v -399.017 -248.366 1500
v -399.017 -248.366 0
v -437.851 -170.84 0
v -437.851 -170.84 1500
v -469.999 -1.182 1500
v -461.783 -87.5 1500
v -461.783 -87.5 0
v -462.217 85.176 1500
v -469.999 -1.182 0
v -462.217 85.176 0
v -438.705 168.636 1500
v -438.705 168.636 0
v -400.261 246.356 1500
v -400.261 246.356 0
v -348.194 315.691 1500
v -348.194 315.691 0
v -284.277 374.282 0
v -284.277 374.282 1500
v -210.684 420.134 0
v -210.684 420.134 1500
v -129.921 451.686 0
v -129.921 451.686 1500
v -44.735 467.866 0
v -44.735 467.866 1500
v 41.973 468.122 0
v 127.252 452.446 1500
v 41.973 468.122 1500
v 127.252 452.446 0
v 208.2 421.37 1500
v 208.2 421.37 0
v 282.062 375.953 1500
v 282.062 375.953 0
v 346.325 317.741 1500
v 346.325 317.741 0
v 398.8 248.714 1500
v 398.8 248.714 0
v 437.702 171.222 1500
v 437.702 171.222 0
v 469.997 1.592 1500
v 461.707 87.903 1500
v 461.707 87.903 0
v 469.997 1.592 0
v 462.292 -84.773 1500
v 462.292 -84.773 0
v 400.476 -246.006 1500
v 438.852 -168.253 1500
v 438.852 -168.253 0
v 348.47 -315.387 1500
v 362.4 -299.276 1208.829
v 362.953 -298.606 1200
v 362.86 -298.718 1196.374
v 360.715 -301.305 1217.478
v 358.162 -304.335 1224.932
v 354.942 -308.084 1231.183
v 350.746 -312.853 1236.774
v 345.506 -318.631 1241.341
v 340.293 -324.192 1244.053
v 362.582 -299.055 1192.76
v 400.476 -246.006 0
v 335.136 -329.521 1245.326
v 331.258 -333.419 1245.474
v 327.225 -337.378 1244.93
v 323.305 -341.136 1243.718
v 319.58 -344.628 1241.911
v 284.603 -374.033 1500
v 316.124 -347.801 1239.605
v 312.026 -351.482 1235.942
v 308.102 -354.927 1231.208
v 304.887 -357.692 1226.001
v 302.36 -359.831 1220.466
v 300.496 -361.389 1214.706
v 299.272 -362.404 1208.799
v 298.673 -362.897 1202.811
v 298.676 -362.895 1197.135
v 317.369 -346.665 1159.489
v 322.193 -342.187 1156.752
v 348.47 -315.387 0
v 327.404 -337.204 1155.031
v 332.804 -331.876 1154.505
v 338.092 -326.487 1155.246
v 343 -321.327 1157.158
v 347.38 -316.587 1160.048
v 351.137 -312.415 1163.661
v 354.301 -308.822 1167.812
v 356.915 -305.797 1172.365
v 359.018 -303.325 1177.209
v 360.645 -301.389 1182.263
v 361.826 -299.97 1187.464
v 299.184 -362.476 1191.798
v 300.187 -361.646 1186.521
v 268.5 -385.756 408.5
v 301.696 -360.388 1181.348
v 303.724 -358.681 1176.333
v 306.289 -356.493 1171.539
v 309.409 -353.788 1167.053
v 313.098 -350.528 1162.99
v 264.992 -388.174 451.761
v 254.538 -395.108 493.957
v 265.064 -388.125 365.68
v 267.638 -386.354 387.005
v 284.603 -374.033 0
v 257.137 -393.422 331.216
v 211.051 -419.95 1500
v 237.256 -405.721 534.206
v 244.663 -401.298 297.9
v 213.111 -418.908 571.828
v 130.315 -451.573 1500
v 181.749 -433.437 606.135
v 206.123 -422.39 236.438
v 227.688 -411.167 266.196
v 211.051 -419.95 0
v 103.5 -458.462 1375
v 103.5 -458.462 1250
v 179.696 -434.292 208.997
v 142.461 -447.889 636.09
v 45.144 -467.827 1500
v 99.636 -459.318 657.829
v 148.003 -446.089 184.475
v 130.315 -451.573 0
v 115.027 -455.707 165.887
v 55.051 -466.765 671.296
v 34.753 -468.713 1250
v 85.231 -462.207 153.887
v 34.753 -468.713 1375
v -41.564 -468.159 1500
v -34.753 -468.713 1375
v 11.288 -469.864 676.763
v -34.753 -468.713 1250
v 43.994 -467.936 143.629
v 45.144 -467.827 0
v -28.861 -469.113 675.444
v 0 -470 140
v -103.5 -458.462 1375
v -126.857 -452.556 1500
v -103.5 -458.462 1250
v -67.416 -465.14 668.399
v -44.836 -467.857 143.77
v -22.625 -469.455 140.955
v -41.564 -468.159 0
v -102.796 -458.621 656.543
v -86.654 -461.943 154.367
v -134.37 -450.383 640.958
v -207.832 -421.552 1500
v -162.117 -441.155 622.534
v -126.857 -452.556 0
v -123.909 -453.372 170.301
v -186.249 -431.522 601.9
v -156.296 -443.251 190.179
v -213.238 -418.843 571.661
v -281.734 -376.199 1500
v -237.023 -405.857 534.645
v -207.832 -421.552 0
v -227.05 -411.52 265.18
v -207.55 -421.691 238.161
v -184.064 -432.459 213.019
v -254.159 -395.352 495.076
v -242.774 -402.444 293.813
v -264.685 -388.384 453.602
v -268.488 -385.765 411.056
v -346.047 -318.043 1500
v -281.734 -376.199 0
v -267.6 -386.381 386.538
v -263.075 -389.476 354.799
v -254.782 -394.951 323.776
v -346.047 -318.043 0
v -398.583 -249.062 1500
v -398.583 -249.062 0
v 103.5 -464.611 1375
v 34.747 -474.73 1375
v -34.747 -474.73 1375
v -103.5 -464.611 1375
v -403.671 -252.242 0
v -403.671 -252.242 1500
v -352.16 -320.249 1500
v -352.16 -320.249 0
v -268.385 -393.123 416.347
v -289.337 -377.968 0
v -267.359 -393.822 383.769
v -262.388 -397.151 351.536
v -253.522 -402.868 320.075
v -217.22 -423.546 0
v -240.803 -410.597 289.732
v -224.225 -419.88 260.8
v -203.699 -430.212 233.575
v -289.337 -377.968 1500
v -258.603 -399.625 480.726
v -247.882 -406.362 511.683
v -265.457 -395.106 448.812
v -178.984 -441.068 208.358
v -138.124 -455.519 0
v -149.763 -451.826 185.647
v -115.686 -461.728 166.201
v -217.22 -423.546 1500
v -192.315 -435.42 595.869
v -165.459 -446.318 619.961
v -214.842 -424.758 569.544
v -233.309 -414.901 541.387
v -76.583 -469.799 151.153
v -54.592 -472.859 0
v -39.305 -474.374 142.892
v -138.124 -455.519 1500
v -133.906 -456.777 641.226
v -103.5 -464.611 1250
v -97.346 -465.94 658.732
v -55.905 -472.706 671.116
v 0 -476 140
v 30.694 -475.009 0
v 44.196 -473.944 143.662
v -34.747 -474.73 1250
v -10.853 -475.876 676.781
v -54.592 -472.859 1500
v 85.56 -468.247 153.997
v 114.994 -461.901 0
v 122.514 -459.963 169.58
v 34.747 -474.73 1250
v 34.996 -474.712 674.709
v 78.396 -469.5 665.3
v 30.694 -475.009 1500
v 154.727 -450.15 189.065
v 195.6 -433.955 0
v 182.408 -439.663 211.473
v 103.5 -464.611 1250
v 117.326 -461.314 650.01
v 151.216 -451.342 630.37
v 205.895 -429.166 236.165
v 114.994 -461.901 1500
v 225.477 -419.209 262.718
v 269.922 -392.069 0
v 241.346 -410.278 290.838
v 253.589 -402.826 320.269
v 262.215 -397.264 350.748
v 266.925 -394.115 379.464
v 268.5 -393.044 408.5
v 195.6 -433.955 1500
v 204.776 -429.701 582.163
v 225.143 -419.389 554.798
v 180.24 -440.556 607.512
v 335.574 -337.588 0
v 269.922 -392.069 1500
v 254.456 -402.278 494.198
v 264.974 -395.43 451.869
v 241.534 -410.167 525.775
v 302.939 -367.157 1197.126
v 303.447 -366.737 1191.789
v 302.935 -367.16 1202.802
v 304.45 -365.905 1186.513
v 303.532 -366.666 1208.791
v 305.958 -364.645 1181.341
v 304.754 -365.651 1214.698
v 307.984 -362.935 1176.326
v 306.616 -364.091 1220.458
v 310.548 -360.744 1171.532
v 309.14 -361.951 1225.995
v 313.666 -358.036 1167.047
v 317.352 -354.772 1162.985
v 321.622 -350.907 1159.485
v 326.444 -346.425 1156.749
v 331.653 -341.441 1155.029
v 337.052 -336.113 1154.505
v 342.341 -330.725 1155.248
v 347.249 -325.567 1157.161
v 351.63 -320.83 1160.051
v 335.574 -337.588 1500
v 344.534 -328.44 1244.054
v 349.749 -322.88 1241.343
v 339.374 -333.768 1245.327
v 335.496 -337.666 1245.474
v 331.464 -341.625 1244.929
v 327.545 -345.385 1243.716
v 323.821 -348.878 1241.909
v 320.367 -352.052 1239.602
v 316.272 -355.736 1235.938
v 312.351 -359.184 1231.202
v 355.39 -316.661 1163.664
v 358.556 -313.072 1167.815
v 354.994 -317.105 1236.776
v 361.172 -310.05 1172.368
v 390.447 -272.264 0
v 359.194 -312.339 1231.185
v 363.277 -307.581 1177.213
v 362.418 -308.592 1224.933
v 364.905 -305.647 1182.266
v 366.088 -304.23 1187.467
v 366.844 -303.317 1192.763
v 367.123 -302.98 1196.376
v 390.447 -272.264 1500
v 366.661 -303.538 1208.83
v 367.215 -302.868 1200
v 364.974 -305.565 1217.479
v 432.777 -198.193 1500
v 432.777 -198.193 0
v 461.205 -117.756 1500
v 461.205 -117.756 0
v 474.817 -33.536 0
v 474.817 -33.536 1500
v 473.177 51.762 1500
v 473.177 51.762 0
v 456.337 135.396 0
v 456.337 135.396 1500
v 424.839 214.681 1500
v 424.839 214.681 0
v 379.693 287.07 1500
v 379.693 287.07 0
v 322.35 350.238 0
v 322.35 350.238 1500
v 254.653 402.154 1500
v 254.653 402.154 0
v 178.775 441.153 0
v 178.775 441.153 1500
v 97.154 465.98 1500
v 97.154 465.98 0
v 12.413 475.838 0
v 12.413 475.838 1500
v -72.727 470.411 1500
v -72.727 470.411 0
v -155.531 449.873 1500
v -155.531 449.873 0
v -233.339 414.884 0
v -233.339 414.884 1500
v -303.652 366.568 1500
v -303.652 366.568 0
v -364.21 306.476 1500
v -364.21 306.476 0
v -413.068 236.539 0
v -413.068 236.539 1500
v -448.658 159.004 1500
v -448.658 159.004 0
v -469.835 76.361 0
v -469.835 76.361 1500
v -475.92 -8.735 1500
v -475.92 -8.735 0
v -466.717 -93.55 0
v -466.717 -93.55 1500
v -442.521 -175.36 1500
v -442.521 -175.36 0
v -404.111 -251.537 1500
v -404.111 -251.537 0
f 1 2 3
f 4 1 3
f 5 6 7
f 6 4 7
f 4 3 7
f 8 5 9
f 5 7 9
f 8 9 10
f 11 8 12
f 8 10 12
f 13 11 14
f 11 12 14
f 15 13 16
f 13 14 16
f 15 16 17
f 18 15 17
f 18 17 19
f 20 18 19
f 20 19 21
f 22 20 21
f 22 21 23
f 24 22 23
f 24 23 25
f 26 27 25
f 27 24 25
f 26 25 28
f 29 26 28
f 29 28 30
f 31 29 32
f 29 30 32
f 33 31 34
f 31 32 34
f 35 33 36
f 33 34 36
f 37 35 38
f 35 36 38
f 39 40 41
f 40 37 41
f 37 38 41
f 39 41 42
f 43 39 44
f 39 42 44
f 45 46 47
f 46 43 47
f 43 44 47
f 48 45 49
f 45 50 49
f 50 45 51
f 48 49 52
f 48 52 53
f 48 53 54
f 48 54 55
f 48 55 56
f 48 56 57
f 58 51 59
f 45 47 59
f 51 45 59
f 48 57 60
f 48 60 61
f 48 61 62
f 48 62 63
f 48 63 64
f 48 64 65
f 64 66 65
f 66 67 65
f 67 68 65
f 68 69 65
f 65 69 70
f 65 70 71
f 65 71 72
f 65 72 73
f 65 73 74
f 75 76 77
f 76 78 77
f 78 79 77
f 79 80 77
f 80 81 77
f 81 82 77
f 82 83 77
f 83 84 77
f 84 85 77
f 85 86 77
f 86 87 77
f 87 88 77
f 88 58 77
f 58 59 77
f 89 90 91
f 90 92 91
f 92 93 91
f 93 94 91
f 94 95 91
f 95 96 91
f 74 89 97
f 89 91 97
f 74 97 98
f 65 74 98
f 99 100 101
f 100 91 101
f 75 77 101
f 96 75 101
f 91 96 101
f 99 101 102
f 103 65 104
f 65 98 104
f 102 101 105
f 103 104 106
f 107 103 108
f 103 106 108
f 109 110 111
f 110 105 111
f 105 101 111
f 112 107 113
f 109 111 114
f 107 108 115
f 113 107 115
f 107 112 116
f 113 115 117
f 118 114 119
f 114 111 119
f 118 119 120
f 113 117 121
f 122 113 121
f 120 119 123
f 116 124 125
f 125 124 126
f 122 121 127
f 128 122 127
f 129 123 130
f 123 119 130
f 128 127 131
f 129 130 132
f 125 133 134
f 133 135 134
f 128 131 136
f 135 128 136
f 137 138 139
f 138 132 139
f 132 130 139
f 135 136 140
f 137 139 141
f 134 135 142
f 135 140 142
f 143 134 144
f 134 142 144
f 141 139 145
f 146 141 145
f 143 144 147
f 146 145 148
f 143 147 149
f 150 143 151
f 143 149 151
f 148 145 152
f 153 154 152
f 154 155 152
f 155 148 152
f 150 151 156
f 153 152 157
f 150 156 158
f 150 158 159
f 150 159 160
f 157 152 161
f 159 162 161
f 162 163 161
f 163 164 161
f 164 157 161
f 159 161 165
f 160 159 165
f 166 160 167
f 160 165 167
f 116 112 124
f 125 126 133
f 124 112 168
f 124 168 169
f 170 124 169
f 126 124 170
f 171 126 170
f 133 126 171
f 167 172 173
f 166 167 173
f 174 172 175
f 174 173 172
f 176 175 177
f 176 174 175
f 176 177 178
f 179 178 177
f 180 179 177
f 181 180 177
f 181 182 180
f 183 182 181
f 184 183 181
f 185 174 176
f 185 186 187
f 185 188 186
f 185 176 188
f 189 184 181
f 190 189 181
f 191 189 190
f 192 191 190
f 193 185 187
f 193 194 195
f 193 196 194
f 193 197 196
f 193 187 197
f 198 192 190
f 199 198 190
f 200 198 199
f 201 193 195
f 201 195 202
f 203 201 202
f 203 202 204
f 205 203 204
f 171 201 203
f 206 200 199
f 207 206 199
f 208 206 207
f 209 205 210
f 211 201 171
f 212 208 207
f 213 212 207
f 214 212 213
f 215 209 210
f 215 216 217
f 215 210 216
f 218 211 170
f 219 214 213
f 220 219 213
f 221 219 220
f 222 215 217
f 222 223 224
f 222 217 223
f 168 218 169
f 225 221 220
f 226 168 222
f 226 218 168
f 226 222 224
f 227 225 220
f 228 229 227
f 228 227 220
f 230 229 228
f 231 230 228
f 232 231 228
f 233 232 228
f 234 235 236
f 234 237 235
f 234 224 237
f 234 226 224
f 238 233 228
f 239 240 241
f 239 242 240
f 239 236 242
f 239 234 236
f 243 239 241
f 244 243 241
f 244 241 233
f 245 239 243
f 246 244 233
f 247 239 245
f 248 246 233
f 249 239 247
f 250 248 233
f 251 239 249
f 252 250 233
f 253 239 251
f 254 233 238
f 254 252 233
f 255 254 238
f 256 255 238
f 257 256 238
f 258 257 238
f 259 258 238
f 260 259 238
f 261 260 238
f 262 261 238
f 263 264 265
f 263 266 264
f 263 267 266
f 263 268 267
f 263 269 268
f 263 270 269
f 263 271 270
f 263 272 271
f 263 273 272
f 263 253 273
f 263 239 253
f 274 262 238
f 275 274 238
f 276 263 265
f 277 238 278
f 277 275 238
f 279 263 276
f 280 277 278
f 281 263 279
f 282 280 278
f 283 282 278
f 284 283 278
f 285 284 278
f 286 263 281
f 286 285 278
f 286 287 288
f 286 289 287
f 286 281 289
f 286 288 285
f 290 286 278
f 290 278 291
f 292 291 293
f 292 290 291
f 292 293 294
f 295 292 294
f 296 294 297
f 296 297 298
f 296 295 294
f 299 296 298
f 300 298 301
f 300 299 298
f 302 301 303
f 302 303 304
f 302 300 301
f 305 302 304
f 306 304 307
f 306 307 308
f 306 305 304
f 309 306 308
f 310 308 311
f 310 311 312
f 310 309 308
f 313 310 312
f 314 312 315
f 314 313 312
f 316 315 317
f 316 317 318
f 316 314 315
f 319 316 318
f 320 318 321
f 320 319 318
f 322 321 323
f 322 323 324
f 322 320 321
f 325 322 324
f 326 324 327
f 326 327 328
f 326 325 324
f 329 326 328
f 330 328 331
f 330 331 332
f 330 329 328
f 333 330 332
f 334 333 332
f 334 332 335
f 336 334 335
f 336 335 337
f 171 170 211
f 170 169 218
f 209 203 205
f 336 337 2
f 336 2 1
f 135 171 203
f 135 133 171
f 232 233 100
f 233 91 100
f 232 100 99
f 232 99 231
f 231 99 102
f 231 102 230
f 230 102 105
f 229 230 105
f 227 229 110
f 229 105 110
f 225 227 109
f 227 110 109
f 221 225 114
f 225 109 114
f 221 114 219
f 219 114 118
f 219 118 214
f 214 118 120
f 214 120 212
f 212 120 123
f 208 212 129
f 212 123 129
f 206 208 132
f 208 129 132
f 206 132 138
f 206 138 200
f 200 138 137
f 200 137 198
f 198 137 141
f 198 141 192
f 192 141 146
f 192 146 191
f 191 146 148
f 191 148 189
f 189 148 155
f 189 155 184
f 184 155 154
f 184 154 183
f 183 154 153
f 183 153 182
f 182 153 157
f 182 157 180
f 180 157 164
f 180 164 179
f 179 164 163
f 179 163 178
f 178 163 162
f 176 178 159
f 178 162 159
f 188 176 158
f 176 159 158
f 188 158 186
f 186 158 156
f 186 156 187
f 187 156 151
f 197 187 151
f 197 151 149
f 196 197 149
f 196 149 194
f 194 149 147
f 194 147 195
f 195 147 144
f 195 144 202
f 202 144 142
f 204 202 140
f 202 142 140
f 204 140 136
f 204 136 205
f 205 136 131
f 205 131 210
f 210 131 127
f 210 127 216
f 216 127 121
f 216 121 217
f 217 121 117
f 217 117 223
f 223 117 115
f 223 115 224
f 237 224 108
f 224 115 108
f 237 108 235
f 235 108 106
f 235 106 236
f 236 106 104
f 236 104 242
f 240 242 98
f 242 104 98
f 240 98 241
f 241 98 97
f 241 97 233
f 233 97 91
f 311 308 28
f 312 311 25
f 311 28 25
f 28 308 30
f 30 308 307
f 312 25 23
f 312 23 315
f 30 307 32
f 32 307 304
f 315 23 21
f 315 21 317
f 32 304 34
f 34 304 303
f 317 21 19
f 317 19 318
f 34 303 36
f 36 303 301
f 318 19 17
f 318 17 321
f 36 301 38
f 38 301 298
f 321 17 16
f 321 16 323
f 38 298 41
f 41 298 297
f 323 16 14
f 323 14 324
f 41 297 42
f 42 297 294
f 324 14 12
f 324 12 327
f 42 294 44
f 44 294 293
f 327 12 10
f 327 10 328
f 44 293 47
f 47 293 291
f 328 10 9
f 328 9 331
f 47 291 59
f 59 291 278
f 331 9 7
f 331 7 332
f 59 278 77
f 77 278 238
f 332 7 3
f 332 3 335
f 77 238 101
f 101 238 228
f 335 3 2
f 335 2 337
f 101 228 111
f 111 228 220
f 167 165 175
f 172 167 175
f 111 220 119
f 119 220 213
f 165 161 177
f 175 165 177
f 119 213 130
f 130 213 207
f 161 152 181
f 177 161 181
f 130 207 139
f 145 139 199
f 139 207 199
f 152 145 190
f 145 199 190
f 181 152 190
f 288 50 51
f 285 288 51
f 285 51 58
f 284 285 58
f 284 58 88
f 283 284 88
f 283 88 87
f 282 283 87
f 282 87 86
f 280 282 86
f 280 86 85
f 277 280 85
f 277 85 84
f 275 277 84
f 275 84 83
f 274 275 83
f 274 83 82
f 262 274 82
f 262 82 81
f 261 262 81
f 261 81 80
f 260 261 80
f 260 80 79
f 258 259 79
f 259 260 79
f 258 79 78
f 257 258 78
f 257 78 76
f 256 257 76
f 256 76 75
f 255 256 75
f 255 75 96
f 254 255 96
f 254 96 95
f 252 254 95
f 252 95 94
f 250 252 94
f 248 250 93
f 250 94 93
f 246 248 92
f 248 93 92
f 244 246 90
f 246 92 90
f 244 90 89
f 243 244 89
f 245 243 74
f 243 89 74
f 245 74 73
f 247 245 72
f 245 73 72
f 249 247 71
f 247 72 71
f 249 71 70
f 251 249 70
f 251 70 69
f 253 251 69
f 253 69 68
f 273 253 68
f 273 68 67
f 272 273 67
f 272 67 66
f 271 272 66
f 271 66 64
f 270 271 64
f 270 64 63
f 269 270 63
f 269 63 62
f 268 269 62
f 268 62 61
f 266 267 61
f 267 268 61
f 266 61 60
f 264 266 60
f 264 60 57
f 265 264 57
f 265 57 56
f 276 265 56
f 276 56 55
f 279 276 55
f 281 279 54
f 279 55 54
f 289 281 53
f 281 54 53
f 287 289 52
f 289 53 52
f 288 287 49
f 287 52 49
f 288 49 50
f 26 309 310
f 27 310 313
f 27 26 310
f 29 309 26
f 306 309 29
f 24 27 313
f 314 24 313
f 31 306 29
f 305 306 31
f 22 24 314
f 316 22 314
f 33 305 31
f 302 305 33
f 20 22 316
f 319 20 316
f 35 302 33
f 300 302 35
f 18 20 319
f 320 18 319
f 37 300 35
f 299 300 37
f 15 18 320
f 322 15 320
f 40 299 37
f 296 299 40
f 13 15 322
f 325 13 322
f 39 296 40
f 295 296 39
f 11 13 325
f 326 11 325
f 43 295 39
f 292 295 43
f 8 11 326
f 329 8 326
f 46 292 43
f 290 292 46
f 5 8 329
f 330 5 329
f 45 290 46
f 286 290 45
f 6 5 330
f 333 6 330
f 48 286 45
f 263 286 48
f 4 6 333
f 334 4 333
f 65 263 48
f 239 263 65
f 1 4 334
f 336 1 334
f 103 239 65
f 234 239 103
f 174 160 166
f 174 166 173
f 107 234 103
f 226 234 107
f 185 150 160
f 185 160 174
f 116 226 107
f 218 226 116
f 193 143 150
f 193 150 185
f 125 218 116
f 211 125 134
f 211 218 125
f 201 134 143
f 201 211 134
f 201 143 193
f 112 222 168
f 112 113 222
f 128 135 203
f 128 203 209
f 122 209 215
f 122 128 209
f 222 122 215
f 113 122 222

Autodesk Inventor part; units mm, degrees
sketch "Sketch13" plane through (0, 0, 0) normal (0, 0, 1) x (1, 0, 0)
  circle A0 centre (0, 0) radius 476 construction
  line L0 (0, 0) -> (0, -476)
  line L1 (0, 0) -> (-403.6709, -252.2416)
  line L2 (0, 0) -> (336.5828, -336.5828)
  line L3 (0, 0) -> (0, -476)
  line L4 (0, 0) -> (0, -476)
  line L5 (0, 0) -> (-424.1191, -216.0995)
  arc A1 (-403.6709, -252.2416) -> (0, -476) centre (0, 0) ccw
  dimension "d53" = 952
  dimension "d54" = 58
  dimension "d55" = 0
  dimension "d56" = 0
  dimension "d57" = 315
  dimension "d58" = 63
ref_plane "WeldJoint" through (0, 0, -10) normal (0.5299, -0.848, 0) x (0, 0, 1)
ref_plane "Outer" through (0, 0, -10) normal (0.454, -0.891, 0) x (0, 0, 1)
ref_plane "Clock_Feeder" through (0, 0, -10) normal (0.7071, 0.7071, 0) x (0, 0, 1)
ref_plane "Charging" through (0, 0, -10) normal (1, 0, 0) x (0, 0, 1)
ref_plane "Accsess" through (0, 0, -10) normal (1, 0, 0) x (0, 0, 1)
sketch "Sketch14" plane through (0, 0, -10) normal (0.5299, -0.848, 0) x (0, 0, 1)
  line L0 (1510, 470) -> (10, 470)
  line L1 (10, 470) -> (10, 476)
  line L2 (10, 476) -> (1510, 476)
  line L3 (1510, 476) -> (1510, 470)
  line L4 (10, 0) -> (825.0673, 0)
  point P0 (10, 473)
  dimension "d59" = 1500
  dimension "d60" = 6
  dimension "d61" = 952
revolve "Revolution2" add sketch "Sketch14" angle 359.9 about axis through (0, 0, 0) along (0, 0, 1)
sketch "Sketch AnglePlane_Feeder" plane through (0, 0, -10) normal (0.7071, 0.7071, 0) x (0, 0, 1)
  line L0 (10, -476) -> (10, 476) projected
  line L1 (10, 0) -> (1210, 0)
  line L2 (1210, 0) -> (1210, 476)
  line L3 (1210, 476) -> (10, 476)
  line L4 (10, 476) -> (10, 0)
  point P0 (10, -107.0767)
  point P1 (10, -107.886)
  dimension "d63" = 952
  dimension "d64" = 90
  dimension "frd_hght" = 1200
ref_plane "AnglePlane_Feeder" through (0, 0, 1200) normal (0.7071, -0.7071, 0) x (0.7071, 0.7071, 0)
sketch "Sketch16" plane through (0, 0, 1200) normal (0.7071, -0.7071, 0) x (0.7071, 0.7071, 0)
  circle A0 centre (0, 0) radius 45.5
  point P0 (0, -1200)
  point P1 (0, 0)
  point P2 (0, 0)
  point P3 (0, 0)
  dimension "d66" = 91
extrude "Extrusion7" cut sketch "Sketch16" along normal through all
ref_plane "Work Plane16" through (0, 0, 0) normal (0, -1, 0) x (1, 0, 0)
sketch "Sketch17" plane through (0, 0, 0) normal (0, -1, 0) x (1, 0, 0)
  circle A0 centre (0, 408.5) radius 268.5
  line L0 (0, 140) -> (-495.5727, 140)
  point P0 (0, 0)
  dimension "d69" = 537
  dimension "d71" = 140
extrude "Extrusion8" cut sketch "Sketch17" along normal through all
sketch "Sketch19" plane through (0, 0, -10) normal (1, 0, 0) x (0, 0, 1)
  line L0 (10, 0) -> (1260, 0)
  line L1 (1260, 0) -> (1260, 476)
  line L2 (1260, 476) -> (10, 476)
  line L3 (10, 476) -> (10, 0)
  dimension "d74" = 1250
  dimension "d76" = 952
  dimension "d77" = 90
ref_plane "Work Plane18" through (0, 0, 1250) normal (0, -1, 0) x (1, 0, 0)
sketch "Sketch20" plane through (0, 0, 1250) normal (0, -1, 0) x (1, 0, 0)
  line L0 (-103.5, 0) -> (103.5, 0)
  line L1 (103.5, 0) -> (103.5, 125)
  line L2 (103.5, 125) -> (-103.5, 125)
  line L3 (-103.5, 125) -> (-103.5, 0)
  point P0 (0, -1250)
  point P1 (0, 0)
  point P2 (0, 0)
  point P3 (0, 0)
  point P4 (0, 0)
  dimension "d78" = 207
  dimension "d79" = 125
extrude "Extrusion9" cut sketch "Sketch20" along normal through all
equation "\"BendRadius\" = Thickness"
equation "\"BendReliefWidth\" = Thickness"
equation "\"BendReliefDepth\" = 0.5 * Thickness"
equation "\"CornerReliefSize\" = 4 * Thickness"
equation "\"MinimumRemnant\" = 2 * Thickness"
equation "\"TransitionRadius\" = BendRadius"
equation "\"JacobiRadiusSize\" = BendRadius"
equation "\"GapSize\" = Thickness"
equation "\"Feeder_horisont_angle\" = 0"
equation "\"MAIN_filter_diam\" = 952"
equation "\"Hatch_Accsess_diameter\" = 535"
equation "\"Clock_Accsess_angle\" = 0"
equation "\"Clock_Charging_agnle\" = 0"
equation "\"Clock_Feeder_angle\" = 315deg"
equation "\"Clock_Outer_angle\" = 63deg"
equation "\"Clock_WeldJoint_angle\" = 58deg"
equation "\"Thickness\" = 6"
properties part number "PNS 9110 main Shell D 940" material "Steel"
